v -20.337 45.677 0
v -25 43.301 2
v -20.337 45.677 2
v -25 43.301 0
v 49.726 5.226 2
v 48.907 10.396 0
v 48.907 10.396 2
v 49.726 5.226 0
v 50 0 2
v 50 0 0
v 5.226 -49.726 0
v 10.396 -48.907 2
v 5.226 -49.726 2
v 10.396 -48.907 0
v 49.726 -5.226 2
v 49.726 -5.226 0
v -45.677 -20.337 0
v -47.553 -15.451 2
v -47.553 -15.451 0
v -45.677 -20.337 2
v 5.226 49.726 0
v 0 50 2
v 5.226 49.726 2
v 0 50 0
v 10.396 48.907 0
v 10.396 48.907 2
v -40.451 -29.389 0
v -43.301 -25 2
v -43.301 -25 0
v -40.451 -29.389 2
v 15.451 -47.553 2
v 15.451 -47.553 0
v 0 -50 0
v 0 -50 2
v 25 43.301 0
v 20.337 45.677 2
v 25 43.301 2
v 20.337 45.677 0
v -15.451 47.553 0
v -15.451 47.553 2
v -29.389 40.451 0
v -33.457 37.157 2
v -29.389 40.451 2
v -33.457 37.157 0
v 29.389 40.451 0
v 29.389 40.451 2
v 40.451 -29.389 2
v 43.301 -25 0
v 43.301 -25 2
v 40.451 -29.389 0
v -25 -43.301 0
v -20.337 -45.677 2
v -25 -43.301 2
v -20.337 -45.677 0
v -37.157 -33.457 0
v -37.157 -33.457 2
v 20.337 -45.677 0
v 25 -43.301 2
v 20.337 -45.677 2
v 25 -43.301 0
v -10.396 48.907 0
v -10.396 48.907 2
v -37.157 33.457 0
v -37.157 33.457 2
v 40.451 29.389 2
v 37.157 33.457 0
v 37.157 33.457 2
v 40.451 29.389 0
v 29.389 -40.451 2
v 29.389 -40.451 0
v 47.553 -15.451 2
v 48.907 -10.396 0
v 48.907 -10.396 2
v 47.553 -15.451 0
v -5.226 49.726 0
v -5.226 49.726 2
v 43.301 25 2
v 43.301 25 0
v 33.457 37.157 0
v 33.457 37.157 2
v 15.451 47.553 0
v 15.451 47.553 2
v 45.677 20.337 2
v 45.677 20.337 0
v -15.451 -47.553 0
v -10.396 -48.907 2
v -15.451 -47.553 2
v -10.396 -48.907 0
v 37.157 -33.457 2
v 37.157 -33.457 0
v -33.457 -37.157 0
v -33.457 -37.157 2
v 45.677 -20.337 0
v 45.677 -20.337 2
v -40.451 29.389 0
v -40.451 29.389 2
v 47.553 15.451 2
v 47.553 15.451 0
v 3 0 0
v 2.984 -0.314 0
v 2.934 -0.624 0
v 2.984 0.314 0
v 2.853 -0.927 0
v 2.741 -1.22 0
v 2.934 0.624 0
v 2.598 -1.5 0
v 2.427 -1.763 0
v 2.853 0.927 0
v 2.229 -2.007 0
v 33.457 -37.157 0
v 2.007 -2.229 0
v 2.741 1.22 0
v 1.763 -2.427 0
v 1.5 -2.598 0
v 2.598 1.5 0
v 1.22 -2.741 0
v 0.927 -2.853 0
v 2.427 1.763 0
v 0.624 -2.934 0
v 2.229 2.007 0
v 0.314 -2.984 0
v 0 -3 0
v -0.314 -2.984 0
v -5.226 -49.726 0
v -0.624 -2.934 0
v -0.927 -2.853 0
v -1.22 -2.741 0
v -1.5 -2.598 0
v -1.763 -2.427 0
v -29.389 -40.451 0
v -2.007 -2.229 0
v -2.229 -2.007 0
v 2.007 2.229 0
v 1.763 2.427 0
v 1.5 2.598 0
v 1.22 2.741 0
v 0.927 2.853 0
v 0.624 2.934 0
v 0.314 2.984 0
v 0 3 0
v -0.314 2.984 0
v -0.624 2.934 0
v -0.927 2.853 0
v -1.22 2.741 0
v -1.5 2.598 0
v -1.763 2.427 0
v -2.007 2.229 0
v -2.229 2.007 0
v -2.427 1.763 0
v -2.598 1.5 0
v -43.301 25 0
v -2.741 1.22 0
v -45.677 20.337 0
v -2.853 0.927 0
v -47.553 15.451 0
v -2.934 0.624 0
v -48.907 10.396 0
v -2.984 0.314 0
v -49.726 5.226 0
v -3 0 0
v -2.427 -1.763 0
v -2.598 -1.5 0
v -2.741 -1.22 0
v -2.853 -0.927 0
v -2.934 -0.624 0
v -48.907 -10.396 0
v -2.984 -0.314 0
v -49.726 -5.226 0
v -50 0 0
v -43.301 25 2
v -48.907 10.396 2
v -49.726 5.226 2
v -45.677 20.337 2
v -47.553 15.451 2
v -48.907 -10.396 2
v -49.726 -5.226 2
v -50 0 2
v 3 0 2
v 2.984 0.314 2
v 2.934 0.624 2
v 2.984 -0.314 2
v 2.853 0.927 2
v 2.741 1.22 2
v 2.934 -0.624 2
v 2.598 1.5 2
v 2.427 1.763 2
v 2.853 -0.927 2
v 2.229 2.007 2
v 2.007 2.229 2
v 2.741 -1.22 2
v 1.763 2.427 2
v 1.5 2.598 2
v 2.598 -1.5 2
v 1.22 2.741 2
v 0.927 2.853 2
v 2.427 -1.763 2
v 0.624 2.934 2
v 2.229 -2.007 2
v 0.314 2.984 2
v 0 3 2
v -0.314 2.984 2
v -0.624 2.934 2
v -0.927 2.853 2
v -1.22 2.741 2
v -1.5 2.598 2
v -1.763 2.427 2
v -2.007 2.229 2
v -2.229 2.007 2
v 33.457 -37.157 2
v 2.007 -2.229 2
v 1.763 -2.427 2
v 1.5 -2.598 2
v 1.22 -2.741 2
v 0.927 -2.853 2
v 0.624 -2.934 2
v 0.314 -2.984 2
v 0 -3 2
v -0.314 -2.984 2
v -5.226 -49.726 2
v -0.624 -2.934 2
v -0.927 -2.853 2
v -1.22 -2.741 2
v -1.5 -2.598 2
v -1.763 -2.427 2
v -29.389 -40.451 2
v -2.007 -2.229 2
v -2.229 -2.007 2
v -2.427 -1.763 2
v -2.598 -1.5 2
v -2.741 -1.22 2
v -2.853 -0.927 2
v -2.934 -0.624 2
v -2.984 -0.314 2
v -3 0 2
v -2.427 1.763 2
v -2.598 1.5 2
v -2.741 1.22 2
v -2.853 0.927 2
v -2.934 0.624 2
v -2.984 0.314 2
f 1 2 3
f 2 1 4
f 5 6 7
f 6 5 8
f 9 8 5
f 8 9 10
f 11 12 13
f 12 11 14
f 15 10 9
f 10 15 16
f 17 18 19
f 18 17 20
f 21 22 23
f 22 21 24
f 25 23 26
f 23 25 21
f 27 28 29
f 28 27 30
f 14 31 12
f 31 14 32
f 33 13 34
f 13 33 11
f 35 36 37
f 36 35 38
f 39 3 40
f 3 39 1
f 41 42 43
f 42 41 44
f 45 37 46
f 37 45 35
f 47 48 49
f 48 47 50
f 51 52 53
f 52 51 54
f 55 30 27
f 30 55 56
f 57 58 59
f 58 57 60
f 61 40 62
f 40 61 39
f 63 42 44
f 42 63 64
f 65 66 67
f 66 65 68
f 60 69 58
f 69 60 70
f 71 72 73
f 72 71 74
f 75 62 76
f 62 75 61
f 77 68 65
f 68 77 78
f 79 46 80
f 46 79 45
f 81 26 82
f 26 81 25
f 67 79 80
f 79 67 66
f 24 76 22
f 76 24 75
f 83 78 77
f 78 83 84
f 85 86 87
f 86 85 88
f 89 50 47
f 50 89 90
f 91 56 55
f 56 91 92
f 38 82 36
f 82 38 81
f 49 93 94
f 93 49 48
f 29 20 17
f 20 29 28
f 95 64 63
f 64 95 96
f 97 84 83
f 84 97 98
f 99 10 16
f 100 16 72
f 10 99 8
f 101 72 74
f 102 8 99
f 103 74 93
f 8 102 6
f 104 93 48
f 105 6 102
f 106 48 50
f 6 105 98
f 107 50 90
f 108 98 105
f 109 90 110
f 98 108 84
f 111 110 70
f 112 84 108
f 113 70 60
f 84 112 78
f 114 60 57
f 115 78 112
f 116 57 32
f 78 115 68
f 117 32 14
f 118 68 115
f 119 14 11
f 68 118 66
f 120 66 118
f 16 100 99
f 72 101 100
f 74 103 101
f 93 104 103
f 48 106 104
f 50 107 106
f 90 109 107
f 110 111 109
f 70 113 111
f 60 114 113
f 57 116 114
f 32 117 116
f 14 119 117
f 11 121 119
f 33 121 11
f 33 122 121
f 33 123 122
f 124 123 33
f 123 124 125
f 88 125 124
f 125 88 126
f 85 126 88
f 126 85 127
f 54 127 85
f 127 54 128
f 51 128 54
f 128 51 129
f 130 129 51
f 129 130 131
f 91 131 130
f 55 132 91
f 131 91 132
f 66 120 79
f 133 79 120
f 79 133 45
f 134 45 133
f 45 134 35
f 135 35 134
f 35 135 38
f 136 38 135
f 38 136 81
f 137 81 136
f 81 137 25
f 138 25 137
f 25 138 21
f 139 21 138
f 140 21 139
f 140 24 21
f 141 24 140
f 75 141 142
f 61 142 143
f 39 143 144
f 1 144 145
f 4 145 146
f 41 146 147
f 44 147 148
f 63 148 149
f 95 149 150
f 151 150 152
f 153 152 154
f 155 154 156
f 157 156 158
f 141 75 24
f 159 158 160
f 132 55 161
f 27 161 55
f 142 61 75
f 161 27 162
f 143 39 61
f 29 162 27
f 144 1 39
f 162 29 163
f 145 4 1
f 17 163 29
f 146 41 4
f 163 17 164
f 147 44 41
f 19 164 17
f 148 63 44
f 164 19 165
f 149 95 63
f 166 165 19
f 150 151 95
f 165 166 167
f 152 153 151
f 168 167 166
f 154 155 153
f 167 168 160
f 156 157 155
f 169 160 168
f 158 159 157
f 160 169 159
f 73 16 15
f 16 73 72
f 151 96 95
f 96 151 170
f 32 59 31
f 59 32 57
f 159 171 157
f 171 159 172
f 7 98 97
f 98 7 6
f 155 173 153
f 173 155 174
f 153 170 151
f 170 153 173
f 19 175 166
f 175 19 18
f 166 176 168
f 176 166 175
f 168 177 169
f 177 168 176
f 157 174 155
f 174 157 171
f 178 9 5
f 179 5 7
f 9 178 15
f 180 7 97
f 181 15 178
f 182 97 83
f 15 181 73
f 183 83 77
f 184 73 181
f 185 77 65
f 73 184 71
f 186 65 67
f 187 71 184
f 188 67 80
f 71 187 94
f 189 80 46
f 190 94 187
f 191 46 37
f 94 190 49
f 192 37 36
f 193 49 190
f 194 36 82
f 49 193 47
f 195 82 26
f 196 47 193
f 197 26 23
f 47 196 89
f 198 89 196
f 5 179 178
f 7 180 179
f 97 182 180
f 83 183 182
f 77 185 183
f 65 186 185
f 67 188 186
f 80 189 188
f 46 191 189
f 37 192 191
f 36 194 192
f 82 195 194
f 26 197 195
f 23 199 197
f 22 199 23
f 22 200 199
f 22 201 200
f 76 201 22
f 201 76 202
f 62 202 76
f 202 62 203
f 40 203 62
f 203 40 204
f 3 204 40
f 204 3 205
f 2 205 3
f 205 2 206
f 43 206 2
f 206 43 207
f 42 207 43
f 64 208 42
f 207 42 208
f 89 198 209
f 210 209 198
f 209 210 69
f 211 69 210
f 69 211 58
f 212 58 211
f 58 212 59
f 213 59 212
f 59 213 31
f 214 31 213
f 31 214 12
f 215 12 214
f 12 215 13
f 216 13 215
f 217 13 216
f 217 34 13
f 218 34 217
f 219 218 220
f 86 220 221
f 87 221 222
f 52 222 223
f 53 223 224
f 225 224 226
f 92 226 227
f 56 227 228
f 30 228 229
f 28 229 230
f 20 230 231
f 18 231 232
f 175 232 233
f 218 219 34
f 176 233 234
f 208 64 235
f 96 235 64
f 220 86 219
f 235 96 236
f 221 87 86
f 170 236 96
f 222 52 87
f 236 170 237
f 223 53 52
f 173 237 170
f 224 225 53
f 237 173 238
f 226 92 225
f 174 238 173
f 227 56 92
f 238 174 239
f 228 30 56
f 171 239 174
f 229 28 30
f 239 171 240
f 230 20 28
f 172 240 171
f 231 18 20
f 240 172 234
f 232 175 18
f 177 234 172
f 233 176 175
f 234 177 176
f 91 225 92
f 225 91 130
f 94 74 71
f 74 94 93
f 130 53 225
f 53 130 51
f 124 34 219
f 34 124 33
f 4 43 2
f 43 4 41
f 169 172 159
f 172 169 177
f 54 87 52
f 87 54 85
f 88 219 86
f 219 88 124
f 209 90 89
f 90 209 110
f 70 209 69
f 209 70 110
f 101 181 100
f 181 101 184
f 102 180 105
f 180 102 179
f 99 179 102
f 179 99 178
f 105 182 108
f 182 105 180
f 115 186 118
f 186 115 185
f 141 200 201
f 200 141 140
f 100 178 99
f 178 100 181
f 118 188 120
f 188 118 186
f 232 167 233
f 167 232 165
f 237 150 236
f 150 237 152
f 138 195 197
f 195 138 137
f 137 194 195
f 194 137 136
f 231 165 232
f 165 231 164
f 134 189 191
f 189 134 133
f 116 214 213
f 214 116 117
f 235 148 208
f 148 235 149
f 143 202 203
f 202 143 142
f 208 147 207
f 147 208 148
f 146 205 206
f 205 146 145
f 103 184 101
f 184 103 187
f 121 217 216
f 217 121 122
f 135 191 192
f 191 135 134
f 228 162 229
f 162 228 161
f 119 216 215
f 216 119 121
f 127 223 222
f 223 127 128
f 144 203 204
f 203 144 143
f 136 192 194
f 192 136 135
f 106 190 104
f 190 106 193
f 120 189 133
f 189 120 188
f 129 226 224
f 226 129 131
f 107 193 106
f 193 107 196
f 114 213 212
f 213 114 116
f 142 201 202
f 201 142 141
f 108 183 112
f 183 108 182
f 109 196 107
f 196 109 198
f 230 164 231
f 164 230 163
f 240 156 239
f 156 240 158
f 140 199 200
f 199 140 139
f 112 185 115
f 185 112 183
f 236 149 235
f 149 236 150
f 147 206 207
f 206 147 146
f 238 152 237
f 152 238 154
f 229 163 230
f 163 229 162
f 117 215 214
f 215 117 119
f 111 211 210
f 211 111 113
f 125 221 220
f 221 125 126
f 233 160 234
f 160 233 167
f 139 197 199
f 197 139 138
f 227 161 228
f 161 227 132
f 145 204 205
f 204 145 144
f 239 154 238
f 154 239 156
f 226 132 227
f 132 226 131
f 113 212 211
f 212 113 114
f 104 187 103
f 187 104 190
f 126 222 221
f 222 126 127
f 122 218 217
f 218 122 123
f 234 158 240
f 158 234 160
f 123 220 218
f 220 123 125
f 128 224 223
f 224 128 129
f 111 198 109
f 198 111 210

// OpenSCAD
// diameter
inner = 6;

// diameter
outer = 100;


thickness = 2;

module washer (inner, outer, thickness) {

    difference() {
        cylinder(d=outer, h=thickness, $fn=60);
        translate([0,0,-thickness])
        cylinder(d=inner, h=thickness*3, $fn=60);
    };
}

// dimensions in mm
washer (inner, outer, thickness);
